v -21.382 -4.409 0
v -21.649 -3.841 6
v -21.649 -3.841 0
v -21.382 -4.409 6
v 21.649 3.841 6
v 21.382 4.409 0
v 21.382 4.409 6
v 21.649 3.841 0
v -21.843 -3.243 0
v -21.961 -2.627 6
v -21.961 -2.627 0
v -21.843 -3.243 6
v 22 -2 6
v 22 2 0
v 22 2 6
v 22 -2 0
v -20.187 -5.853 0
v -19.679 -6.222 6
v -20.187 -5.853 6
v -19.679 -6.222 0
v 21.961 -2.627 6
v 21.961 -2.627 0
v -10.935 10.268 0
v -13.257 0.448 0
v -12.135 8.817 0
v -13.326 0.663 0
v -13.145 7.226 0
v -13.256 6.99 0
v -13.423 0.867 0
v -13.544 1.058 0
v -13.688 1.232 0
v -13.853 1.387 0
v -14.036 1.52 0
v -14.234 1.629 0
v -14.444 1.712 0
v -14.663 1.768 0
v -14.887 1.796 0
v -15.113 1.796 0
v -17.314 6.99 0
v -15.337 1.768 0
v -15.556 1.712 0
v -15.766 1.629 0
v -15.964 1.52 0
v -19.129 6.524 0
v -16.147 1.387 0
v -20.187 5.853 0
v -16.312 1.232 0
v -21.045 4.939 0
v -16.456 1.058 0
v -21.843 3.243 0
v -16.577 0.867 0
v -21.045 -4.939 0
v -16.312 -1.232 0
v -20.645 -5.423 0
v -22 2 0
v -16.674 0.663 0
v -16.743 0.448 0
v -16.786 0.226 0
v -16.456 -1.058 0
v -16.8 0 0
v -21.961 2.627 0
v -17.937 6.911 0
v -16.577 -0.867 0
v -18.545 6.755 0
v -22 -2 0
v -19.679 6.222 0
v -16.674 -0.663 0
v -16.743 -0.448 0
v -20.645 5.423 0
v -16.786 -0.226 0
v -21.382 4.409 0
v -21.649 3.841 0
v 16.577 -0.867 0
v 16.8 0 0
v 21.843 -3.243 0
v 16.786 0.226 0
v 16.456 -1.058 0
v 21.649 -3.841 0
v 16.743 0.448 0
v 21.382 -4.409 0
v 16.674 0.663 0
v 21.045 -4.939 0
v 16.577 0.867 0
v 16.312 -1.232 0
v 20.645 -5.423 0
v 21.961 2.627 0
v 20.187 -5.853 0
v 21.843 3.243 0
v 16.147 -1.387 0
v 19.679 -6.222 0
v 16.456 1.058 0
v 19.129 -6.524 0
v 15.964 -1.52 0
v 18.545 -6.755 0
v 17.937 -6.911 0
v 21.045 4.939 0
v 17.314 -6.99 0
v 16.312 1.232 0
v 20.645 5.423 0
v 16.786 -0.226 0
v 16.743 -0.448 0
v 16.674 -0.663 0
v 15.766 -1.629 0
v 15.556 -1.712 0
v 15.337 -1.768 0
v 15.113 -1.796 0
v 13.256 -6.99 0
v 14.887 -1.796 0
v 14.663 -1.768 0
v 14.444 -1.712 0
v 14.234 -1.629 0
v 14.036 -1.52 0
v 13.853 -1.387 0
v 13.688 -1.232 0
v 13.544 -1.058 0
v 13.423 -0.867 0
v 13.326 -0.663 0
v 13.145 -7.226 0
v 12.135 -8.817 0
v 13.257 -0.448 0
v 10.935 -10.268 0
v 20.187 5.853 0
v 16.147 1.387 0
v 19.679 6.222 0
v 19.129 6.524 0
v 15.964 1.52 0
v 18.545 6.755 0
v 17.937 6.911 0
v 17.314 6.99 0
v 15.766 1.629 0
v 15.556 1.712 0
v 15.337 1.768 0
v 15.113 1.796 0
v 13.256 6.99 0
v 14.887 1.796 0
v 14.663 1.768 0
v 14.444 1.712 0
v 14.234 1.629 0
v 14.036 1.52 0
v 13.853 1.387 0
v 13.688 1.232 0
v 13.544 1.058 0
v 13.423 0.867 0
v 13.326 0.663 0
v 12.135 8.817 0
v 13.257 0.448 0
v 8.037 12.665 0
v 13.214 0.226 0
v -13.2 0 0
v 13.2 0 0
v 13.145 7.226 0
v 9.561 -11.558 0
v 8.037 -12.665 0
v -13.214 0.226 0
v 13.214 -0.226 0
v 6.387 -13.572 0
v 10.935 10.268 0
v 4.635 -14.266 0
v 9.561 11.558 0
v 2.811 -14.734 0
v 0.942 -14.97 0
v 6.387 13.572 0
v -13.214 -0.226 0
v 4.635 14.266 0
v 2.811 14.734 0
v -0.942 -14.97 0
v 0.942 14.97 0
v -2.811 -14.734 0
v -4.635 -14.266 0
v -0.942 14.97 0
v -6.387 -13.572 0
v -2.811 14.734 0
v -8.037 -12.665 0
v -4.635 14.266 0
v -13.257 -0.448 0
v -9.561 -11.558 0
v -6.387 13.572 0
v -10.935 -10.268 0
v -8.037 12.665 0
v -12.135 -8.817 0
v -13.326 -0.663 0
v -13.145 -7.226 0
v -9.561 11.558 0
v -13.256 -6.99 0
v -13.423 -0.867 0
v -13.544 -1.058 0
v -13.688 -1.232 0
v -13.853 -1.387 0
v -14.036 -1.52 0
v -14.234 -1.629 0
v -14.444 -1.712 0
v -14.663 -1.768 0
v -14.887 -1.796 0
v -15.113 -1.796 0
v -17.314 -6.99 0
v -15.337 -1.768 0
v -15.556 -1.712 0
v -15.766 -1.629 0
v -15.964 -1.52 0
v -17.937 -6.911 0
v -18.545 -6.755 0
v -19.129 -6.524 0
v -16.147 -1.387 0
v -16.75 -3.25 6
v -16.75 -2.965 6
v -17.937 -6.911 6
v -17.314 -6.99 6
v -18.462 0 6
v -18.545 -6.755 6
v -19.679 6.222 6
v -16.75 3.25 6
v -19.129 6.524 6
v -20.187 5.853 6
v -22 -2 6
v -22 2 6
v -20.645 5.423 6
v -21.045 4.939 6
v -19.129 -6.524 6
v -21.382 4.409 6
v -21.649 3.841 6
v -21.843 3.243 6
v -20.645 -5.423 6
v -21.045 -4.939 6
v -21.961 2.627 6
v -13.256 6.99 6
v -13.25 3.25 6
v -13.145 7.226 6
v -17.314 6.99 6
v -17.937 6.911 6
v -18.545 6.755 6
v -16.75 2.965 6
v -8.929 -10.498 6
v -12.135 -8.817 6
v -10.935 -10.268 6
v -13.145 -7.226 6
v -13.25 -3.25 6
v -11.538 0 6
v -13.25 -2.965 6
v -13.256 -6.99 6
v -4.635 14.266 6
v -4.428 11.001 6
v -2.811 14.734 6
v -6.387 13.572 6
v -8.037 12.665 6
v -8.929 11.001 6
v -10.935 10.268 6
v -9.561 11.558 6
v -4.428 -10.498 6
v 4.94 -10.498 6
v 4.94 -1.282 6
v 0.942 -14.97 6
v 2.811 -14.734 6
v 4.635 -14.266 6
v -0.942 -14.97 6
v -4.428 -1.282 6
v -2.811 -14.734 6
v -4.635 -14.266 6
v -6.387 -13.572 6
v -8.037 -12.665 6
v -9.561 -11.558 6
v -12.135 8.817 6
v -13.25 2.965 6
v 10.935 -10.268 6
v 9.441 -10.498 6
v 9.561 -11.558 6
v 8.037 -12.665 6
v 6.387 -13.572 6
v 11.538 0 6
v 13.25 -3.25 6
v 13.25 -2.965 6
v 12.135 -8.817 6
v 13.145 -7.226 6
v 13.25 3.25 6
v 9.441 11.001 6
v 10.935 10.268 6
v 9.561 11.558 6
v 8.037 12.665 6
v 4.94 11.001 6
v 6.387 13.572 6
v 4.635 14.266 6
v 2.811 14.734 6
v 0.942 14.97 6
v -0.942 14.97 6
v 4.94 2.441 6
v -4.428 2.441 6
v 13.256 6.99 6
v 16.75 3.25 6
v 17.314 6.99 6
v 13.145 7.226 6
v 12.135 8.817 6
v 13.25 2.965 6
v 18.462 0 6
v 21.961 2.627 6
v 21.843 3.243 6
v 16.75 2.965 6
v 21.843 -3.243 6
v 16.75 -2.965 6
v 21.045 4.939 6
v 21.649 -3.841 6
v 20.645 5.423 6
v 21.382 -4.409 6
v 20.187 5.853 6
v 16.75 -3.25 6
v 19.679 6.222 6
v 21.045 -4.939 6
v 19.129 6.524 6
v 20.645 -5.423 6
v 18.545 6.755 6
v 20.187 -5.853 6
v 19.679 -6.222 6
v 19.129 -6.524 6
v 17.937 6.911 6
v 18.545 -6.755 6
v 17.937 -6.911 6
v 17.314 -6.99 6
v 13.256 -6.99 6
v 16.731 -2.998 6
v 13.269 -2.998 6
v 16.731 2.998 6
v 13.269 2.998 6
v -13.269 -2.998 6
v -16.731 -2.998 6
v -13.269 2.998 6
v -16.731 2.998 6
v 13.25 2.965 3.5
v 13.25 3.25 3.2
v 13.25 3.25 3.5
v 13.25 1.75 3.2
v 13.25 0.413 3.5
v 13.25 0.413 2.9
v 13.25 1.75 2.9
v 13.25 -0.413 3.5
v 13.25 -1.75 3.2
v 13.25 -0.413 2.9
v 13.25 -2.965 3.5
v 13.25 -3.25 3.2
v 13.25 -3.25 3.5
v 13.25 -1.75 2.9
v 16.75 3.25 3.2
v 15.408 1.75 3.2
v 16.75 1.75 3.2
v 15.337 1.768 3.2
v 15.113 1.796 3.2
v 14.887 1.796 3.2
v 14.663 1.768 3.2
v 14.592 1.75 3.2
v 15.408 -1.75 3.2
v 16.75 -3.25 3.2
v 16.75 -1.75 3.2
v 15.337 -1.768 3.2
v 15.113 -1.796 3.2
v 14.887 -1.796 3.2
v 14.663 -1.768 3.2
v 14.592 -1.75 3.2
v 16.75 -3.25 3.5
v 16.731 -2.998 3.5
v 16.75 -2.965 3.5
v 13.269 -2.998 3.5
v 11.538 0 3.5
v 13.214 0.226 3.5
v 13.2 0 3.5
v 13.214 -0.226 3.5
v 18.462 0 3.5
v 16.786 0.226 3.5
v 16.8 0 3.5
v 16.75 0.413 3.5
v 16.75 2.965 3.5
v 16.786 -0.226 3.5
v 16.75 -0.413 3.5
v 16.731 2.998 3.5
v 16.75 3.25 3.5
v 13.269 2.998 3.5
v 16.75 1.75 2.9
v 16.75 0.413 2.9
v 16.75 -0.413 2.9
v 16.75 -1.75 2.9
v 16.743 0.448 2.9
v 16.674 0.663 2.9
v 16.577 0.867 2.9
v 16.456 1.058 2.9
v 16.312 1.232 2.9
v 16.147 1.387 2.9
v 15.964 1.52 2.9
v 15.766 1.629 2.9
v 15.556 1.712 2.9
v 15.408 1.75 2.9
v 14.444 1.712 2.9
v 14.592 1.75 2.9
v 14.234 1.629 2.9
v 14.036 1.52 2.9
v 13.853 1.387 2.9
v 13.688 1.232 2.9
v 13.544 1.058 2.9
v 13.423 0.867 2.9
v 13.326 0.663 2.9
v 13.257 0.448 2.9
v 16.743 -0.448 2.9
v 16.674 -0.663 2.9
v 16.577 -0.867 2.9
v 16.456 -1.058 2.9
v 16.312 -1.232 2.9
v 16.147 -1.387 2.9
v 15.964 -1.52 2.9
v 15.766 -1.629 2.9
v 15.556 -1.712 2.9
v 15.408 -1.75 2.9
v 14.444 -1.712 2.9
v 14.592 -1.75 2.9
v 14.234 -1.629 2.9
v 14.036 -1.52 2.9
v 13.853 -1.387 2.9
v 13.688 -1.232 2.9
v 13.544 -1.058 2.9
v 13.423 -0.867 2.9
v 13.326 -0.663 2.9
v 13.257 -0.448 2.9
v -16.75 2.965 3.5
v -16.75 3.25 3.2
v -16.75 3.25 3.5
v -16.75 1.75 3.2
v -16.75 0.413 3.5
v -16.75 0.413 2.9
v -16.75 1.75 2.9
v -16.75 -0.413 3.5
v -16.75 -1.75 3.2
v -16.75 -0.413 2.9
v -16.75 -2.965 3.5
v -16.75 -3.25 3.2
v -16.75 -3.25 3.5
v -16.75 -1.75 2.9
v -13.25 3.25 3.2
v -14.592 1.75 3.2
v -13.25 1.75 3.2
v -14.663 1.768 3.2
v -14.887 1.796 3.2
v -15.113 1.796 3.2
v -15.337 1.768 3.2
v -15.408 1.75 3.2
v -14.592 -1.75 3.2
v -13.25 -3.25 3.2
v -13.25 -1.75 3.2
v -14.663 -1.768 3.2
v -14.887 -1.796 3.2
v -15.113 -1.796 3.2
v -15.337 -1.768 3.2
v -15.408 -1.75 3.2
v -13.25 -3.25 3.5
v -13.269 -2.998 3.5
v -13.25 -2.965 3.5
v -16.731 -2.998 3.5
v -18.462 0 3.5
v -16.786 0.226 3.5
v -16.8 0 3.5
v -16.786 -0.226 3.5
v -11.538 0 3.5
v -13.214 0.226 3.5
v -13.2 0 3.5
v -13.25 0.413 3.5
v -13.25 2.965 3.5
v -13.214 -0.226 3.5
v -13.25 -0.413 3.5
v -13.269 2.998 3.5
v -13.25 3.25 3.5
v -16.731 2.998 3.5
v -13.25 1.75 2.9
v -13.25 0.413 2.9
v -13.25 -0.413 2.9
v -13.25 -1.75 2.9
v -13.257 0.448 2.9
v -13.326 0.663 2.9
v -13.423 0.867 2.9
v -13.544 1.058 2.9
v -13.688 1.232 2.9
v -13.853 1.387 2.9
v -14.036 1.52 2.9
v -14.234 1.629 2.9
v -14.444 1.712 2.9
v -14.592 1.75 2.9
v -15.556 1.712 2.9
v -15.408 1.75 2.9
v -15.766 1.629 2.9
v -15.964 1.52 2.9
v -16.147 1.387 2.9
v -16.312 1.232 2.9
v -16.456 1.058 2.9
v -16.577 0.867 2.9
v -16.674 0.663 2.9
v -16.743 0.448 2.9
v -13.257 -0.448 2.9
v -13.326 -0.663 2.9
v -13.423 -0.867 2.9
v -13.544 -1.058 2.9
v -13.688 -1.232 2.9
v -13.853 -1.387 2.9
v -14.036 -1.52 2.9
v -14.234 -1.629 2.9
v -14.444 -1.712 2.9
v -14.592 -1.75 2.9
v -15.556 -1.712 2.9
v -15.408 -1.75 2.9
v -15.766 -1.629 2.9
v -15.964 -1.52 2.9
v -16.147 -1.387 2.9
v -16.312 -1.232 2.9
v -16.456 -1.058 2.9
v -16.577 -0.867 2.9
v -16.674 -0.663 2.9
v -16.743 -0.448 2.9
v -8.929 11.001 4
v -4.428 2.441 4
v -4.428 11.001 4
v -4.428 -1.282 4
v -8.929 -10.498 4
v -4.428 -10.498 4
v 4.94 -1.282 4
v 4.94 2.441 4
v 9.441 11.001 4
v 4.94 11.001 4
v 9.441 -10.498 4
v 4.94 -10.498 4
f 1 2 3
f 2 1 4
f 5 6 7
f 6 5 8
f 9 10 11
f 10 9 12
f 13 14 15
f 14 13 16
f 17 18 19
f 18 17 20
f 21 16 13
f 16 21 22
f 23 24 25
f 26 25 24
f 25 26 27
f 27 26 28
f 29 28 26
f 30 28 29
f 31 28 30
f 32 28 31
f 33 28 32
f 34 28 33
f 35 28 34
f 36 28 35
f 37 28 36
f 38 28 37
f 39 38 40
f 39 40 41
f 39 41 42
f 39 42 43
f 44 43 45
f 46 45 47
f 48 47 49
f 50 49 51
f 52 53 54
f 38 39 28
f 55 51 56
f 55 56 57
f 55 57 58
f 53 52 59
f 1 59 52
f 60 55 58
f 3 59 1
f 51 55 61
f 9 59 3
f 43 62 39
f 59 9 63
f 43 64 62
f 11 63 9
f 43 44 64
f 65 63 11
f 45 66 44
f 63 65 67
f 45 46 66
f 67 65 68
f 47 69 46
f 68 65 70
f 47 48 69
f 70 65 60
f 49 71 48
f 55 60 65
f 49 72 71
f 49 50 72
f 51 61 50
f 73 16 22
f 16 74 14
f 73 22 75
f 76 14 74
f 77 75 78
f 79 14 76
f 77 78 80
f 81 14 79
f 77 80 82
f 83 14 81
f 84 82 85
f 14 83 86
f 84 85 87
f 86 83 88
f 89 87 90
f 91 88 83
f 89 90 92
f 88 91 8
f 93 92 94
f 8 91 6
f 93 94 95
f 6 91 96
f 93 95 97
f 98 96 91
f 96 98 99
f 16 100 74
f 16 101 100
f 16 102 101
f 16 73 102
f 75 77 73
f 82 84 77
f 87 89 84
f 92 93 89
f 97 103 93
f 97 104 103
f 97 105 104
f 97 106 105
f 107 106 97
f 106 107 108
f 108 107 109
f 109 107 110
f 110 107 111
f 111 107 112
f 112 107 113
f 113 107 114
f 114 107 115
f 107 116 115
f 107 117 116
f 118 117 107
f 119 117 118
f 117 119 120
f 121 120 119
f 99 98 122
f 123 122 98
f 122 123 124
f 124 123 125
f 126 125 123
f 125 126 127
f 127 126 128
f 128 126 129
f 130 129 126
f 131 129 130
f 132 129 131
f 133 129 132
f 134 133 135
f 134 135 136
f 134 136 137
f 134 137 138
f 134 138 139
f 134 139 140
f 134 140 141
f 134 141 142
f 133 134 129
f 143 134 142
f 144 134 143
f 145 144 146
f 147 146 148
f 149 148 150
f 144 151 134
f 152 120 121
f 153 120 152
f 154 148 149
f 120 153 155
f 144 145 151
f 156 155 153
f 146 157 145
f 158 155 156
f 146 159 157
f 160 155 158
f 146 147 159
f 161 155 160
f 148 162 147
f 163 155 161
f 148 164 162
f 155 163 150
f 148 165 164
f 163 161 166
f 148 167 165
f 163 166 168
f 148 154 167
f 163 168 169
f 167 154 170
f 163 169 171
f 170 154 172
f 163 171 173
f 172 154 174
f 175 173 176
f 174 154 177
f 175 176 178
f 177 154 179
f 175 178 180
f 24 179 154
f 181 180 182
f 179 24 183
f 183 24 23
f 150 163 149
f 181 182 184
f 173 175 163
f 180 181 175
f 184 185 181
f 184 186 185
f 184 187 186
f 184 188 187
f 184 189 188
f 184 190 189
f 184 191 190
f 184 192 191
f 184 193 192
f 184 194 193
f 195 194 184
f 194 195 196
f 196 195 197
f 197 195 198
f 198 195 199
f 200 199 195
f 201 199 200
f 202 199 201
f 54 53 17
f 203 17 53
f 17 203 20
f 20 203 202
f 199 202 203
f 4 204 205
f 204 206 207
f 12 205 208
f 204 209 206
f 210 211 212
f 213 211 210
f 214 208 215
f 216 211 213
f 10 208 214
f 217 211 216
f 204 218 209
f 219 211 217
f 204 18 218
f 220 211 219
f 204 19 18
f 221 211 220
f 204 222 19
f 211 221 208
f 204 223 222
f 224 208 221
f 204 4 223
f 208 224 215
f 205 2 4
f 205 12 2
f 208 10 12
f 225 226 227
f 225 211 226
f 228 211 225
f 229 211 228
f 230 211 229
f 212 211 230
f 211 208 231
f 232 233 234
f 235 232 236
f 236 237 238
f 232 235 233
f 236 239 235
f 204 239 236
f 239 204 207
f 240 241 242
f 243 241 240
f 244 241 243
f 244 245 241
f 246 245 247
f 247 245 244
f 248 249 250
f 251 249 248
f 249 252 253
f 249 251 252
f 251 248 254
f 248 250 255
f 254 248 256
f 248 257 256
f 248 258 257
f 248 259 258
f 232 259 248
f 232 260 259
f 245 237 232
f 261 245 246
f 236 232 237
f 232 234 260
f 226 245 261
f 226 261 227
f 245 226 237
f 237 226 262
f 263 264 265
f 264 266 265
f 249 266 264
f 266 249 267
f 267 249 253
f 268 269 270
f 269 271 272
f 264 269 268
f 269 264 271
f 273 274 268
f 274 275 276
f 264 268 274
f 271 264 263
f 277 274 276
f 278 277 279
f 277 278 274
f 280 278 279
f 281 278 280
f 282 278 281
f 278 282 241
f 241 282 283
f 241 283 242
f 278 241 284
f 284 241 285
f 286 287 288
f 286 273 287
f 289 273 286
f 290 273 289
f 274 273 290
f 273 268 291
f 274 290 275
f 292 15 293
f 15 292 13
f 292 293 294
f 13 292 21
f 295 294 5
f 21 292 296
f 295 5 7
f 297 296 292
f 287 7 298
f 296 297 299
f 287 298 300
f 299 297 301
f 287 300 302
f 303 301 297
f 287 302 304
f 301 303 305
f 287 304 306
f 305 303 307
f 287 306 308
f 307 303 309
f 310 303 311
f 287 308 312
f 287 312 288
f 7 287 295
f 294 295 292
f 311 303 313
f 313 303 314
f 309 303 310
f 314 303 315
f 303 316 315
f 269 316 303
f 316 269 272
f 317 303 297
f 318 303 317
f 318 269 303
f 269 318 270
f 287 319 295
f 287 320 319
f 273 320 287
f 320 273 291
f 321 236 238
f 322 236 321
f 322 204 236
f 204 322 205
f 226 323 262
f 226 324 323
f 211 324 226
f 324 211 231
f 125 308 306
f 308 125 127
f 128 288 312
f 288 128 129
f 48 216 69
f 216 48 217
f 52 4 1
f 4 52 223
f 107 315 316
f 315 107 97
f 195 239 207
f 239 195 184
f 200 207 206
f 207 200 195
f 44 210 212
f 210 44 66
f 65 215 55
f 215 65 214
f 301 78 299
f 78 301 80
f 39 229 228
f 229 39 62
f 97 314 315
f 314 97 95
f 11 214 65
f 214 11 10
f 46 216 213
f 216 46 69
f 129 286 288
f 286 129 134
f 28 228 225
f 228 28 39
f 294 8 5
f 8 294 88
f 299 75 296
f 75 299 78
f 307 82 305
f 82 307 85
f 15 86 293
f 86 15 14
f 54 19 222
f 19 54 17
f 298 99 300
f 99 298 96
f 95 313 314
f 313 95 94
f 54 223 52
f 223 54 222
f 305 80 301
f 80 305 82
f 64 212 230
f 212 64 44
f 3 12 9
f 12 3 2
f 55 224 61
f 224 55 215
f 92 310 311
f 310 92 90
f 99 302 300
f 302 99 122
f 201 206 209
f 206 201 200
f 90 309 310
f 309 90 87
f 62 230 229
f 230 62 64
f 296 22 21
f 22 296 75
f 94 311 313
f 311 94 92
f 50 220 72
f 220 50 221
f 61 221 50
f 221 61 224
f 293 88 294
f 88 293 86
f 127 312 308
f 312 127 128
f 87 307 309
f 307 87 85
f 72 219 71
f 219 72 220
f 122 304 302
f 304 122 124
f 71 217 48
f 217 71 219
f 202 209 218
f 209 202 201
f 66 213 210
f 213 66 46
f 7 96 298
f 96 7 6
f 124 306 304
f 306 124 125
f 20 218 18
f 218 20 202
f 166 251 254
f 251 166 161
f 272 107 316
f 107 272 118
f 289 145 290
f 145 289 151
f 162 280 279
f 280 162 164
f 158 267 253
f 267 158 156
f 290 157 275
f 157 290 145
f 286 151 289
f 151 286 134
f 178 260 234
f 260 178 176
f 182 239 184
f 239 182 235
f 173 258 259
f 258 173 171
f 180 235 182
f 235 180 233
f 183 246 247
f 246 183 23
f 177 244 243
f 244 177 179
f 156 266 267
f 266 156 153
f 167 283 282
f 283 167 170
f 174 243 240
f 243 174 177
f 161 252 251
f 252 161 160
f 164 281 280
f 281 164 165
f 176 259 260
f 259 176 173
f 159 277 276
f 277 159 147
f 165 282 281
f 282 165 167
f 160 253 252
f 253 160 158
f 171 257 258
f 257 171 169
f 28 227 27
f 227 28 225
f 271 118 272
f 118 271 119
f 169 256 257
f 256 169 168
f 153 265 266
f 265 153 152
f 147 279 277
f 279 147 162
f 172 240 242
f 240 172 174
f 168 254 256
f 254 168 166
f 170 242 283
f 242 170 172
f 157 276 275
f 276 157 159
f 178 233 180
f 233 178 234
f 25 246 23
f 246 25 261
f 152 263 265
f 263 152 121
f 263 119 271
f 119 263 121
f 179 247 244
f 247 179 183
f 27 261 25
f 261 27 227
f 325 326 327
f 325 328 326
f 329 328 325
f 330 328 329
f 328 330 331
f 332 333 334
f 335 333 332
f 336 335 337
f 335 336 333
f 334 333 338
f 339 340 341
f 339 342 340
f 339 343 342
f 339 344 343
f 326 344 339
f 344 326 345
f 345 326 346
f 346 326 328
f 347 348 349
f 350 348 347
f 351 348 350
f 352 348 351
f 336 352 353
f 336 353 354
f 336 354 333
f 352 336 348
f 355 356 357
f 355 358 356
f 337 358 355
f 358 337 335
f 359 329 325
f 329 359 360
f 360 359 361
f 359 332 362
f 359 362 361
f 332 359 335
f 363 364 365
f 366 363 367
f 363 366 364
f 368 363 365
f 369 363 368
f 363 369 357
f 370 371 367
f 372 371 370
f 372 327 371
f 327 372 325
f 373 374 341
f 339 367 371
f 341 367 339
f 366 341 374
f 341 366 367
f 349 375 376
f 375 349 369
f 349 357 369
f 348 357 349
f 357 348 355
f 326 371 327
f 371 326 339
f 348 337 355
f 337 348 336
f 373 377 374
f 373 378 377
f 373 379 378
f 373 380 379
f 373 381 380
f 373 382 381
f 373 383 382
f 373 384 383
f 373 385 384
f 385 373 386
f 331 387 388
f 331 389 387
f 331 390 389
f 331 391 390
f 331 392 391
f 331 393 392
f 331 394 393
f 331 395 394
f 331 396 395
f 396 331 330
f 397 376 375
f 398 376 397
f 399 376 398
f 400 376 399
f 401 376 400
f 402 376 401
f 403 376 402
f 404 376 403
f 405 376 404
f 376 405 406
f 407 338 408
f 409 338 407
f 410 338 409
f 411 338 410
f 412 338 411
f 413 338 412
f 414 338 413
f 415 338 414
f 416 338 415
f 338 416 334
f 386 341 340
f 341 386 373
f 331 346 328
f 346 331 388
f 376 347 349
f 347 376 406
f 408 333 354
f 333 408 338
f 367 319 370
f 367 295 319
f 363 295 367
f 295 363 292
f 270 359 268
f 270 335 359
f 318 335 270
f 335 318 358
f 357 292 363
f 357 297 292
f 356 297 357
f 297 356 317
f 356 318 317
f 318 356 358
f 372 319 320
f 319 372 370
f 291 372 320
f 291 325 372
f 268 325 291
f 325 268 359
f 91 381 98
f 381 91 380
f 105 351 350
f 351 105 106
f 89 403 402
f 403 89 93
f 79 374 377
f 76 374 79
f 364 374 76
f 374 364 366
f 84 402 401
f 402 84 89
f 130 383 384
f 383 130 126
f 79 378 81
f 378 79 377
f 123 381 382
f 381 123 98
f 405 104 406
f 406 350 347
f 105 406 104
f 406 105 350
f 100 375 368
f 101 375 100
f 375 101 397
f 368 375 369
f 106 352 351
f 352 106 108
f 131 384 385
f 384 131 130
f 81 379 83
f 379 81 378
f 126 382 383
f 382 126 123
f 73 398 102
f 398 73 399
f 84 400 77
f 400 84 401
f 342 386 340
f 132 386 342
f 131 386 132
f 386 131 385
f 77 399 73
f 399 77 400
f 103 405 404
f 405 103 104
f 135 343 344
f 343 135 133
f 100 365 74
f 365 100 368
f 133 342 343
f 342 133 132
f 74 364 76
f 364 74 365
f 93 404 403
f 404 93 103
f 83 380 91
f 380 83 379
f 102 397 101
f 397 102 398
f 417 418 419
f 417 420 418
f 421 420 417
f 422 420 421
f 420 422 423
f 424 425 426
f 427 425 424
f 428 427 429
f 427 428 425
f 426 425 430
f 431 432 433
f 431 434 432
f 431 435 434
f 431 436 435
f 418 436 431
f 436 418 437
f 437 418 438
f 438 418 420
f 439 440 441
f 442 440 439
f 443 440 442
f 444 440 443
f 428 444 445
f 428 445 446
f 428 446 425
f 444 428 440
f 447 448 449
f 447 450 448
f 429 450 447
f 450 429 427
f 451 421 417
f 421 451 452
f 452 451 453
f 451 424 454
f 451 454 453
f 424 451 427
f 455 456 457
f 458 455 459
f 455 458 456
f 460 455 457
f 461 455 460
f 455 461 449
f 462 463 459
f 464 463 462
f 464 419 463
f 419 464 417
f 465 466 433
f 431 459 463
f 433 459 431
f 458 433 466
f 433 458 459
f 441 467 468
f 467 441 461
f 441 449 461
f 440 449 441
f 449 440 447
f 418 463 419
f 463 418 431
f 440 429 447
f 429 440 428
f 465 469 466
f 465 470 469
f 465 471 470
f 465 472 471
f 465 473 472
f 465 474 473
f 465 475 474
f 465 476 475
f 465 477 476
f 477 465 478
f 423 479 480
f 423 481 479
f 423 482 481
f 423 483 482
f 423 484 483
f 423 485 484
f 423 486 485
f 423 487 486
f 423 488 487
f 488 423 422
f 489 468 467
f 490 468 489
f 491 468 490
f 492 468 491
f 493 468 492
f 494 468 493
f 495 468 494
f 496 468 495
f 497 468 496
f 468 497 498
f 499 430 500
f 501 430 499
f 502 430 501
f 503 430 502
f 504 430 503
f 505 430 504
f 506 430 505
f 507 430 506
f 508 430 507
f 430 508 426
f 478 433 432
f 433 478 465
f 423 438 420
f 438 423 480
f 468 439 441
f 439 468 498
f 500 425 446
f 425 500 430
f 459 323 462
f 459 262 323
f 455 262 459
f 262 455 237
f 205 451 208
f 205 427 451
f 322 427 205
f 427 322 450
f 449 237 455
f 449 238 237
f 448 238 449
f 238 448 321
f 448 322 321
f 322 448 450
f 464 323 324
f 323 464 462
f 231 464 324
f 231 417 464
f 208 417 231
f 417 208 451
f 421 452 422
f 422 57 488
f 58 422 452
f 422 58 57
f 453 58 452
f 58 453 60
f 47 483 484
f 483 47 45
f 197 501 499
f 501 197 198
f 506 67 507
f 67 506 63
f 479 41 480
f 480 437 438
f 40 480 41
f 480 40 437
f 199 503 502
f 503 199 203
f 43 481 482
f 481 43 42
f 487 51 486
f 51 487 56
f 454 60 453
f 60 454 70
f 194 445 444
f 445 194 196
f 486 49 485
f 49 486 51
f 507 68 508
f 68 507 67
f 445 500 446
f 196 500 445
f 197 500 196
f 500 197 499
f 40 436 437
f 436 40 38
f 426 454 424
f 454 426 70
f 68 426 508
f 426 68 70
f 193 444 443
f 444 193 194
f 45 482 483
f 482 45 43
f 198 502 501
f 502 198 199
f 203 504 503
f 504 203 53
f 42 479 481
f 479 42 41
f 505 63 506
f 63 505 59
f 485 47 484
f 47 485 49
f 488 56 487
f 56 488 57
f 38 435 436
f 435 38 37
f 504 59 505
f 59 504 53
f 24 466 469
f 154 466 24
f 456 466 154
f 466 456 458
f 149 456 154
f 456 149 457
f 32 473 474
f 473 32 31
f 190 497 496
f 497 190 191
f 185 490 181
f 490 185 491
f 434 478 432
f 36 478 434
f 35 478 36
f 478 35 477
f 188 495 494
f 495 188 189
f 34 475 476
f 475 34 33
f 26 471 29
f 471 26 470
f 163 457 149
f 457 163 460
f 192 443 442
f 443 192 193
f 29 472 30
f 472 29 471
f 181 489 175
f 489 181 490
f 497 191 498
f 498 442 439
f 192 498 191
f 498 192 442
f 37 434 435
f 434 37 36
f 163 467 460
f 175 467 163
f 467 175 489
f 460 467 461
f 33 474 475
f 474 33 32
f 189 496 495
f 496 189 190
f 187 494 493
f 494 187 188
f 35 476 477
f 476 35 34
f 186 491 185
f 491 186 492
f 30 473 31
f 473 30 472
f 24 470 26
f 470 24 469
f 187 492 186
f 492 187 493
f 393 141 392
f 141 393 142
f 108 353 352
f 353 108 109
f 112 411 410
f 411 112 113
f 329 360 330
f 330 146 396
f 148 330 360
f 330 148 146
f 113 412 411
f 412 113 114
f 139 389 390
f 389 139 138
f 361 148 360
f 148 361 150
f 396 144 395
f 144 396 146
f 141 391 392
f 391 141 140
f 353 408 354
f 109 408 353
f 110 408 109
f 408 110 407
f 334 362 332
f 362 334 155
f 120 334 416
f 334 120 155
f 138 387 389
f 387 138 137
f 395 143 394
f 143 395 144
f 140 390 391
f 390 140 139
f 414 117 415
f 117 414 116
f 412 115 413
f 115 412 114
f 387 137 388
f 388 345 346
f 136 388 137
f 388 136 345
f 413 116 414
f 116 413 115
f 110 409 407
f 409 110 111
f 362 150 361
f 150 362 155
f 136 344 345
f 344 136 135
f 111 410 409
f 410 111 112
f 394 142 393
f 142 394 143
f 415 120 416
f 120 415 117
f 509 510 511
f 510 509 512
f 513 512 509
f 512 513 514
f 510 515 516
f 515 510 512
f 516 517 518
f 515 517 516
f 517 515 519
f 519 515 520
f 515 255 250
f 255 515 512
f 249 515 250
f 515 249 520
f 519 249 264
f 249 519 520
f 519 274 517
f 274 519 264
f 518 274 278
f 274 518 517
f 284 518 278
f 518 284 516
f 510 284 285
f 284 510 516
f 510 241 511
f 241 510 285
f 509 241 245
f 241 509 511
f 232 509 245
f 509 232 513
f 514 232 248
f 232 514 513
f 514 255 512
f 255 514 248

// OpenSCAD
$fn = 50;


difference() {
	union() {
		hull() {
			translate(v = [-17.0000000000, 2.0000000000, 0]) {
				cylinder(h = 6, r = 5);
			}
			translate(v = [17.0000000000, 2.0000000000, 0]) {
				cylinder(h = 6, r = 5);
			}
			translate(v = [-17.0000000000, -2.0000000000, 0]) {
				cylinder(h = 6, r = 5);
			}
			translate(v = [17.0000000000, -2.0000000000, 0]) {
				cylinder(h = 6, r = 5);
			}
		}
		cylinder(h = 6, r = 15.0000000000);
	}
	union() {
		translate(v = [15.0000000000, 0, -20]) {
			rotate(a = [0, 180, 0]) {
				difference() {
					union() {
						translate(v = [0, 0, -26.0000000000]) {
							rotate(a = [0, 0, 0]) {
								difference() {
									union() {
										#translate(v = [-1.7500000000, -3.2500000000, -0.3000000000]) {
											cube(size = [3.5000000000, 6.5000000000, 0.3000000000]);
										}
										#translate(v = [-1.7500000000, -1.7500000000, -0.6000000000]) {
											cube(size = [3.5000000000, 3.5000000000, 0.3000000000]);
										}
										#translate(v = [-1.7500000000, -3.2500000000, 2.5000000000]) {
											cube(size = [3.5000000000, 6.5000000000, 0.3000000000]);
										}
										#translate(v = [-1.7500000000, -1.7500000000, 2.8000000000]) {
											cube(size = [3.5000000000, 3.5000000000, 0.3000000000]);
										}
										#linear_extrude(height = 2.5000000000) {
											polygon(points = [[3.4620000000, 0.0000000000], [1.7310000000, 2.9981799479], [-1.7310000000, 2.9981799479], [-3.4620000000, 0.0000000000], [-1.7310000000, -2.9981799479], [1.7310000000, -2.9981799479]]);
										}
										#translate(v = [-1.7500000000, -3.2500000000, -0.3000000000]) {
											cube(size = [3.5000000000, 6.5000000000, 0.3000000000]);
										}
										#translate(v = [-1.7500000000, -1.7500000000, -0.6000000000]) {
											cube(size = [3.5000000000, 3.5000000000, 0.3000000000]);
										}
										#translate(v = [-1.7500000000, -3.2500000000, 2.5000000000]) {
											cube(size = [3.5000000000, 6.5000000000, 0.3000000000]);
										}
										#translate(v = [-1.7500000000, -1.7500000000, 2.8000000000]) {
											cube(size = [3.5000000000, 3.5000000000, 0.3000000000]);
										}
										#translate(v = [-1.7500000000, -3.2500000000, -0.3000000000]) {
											cube(size = [3.5000000000, 6.5000000000, 0.3000000000]);
										}
										#translate(v = [-1.7500000000, -1.7500000000, -0.6000000000]) {
											cube(size = [3.5000000000, 3.5000000000, 0.3000000000]);
										}
										#translate(v = [-1.7500000000, -3.2500000000, 2.5000000000]) {
											cube(size = [3.5000000000, 6.5000000000, 0.3000000000]);
										}
										#translate(v = [-1.7500000000, -1.7500000000, 2.8000000000]) {
											cube(size = [3.5000000000, 3.5000000000, 0.3000000000]);
										}
									}
									union();
								}
							}
						}
						translate(v = [0, 0, -26.0000000000]) {
							rotate(a = [0, 0, 0]) {
								difference() {
									union() {
										#translate(v = [-1.7500000000, -3.2500000000, -0.3000000000]) {
											cube(size = [3.5000000000, 6.5000000000, 0.3000000000]);
										}
										#translate(v = [-1.7500000000, -1.7500000000, -0.6000000000]) {
											cube(size = [3.5000000000, 3.5000000000, 0.3000000000]);
										}
										#translate(v = [-1.7500000000, -3.2500000000, 2.5000000000]) {
											cube(size = [3.5000000000, 6.5000000000, 0.3000000000]);
										}
										#translate(v = [-1.7500000000, -1.7500000000, 2.8000000000]) {
											cube(size = [3.5000000000, 3.5000000000, 0.3000000000]);
										}
										#linear_extrude(height = 2.5000000000) {
											polygon(points = [[3.4620000000, 0.0000000000], [1.7310000000, 2.9981799479], [-1.7310000000, 2.9981799479], [-3.4620000000, 0.0000000000], [-1.7310000000, -2.9981799479], [1.7310000000, -2.9981799479]]);
										}
										#translate(v = [-1.7500000000, -3.2500000000, -0.3000000000]) {
											cube(size = [3.5000000000, 6.5000000000, 0.3000000000]);
										}
										#translate(v = [-1.7500000000, -1.7500000000, -0.6000000000]) {
											cube(size = [3.5000000000, 3.5000000000, 0.3000000000]);
										}
										#translate(v = [-1.7500000000, -3.2500000000, 2.5000000000]) {
											cube(size = [3.5000000000, 6.5000000000, 0.3000000000]);
										}
										#translate(v = [-1.7500000000, -1.7500000000, 2.8000000000]) {
											cube(size = [3.5000000000, 3.5000000000, 0.3000000000]);
										}
										#translate(v = [-1.7500000000, -3.2500000000, -0.3000000000]) {
											cube(size = [3.5000000000, 6.5000000000, 0.3000000000]);
										}
										#translate(v = [-1.7500000000, -1.7500000000, -0.6000000000]) {
											cube(size = [3.5000000000, 3.5000000000, 0.3000000000]);
										}
										#translate(v = [-1.7500000000, -3.2500000000, 2.5000000000]) {
											cube(size = [3.5000000000, 6.5000000000, 0.3000000000]);
										}
										#translate(v = [-1.7500000000, -1.7500000000, 2.8000000000]) {
											cube(size = [3.5000000000, 3.5000000000, 0.3000000000]);
										}
									}
									union();
								}
							}
						}
						translate(v = [0, 0, -26.0000000000]) {
							rotate(a = [0, 0, 0]) {
								difference() {
									union() {
										#translate(v = [-1.7500000000, -3.2500000000, -0.3000000000]) {
											cube(size = [3.5000000000, 6.5000000000, 0.3000000000]);
										}
										#translate(v = [-1.7500000000, -1.7500000000, -0.6000000000]) {
											cube(size = [3.5000000000, 3.5000000000, 0.3000000000]);
										}
										#translate(v = [-1.7500000000, -3.2500000000, 2.5000000000]) {
											cube(size = [3.5000000000, 6.5000000000, 0.3000000000]);
										}
										#translate(v = [-1.7500000000, -1.7500000000, 2.8000000000]) {
											cube(size = [3.5000000000, 3.5000000000, 0.3000000000]);
										}
										#linear_extrude(height = 2.5000000000) {
											polygon(points = [[3.4620000000, 0.0000000000], [1.7310000000, 2.9981799479], [-1.7310000000, 2.9981799479], [-3.4620000000, 0.0000000000], [-1.7310000000, -2.9981799479], [1.7310000000, -2.9981799479]]);
										}
										#translate(v = [-1.7500000000, -3.2500000000, -0.3000000000]) {
											cube(size = [3.5000000000, 6.5000000000, 0.3000000000]);
										}
										#translate(v = [-1.7500000000, -1.7500000000, -0.6000000000]) {
											cube(size = [3.5000000000, 3.5000000000, 0.3000000000]);
										}
										#translate(v = [-1.7500000000, -3.2500000000, 2.5000000000]) {
											cube(size = [3.5000000000, 6.5000000000, 0.3000000000]);
										}
										#translate(v = [-1.7500000000, -1.7500000000, 2.8000000000]) {
											cube(size = [3.5000000000, 3.5000000000, 0.3000000000]);
										}
										#translate(v = [-1.7500000000, -3.2500000000, -0.3000000000]) {
											cube(size = [3.5000000000, 6.5000000000, 0.3000000000]);
										}
										#translate(v = [-1.7500000000, -1.7500000000, -0.6000000000]) {
											cube(size = [3.5000000000, 3.5000000000, 0.3000000000]);
										}
										#translate(v = [-1.7500000000, -3.2500000000, 2.5000000000]) {
											cube(size = [3.5000000000, 6.5000000000, 0.3000000000]);
										}
										#translate(v = [-1.7500000000, -1.7500000000, 2.8000000000]) {
											cube(size = [3.5000000000, 3.5000000000, 0.3000000000]);
										}
									}
									union();
								}
							}
						}
						#translate(v = [0, 0, -26.0000000000]) {
							cylinder(h = 26, r = 1.5000000000);
						}
						#translate(v = [0, 0, -1.9000000000]) {
							cylinder(h = 1.9000000000, r1 = 1.8000000000, r2 = 3.6000000000);
						}
						#translate(v = [0, 0, -26.0000000000]) {
							cylinder(h = 26, r = 1.8000000000);
						}
						#translate(v = [0, 0, -26.0000000000]) {
							cylinder(h = 26, r = 1.5000000000);
						}
					}
					union();
				}
			}
		}
		translate(v = [-15.0000000000, 0, -20]) {
			rotate(a = [0, 180, 0]) {
				difference() {
					union() {
						translate(v = [0, 0, -26.0000000000]) {
							rotate(a = [0, 0, 0]) {
								difference() {
									union() {
										#translate(v = [-1.7500000000, -3.2500000000, -0.3000000000]) {
											cube(size = [3.5000000000, 6.5000000000, 0.3000000000]);
										}
										#translate(v = [-1.7500000000, -1.7500000000, -0.6000000000]) {
											cube(size = [3.5000000000, 3.5000000000, 0.3000000000]);
										}
										#translate(v = [-1.7500000000, -3.2500000000, 2.5000000000]) {
											cube(size = [3.5000000000, 6.5000000000, 0.3000000000]);
										}
										#translate(v = [-1.7500000000, -1.7500000000, 2.8000000000]) {
											cube(size = [3.5000000000, 3.5000000000, 0.3000000000]);
										}
										#linear_extrude(height = 2.5000000000) {
											polygon(points = [[3.4620000000, 0.0000000000], [1.7310000000, 2.9981799479], [-1.7310000000, 2.9981799479], [-3.4620000000, 0.0000000000], [-1.7310000000, -2.9981799479], [1.7310000000, -2.9981799479]]);
										}
										#translate(v = [-1.7500000000, -3.2500000000, -0.3000000000]) {
											cube(size = [3.5000000000, 6.5000000000, 0.3000000000]);
										}
										#translate(v = [-1.7500000000, -1.7500000000, -0.6000000000]) {
											cube(size = [3.5000000000, 3.5000000000, 0.3000000000]);
										}
										#translate(v = [-1.7500000000, -3.2500000000, 2.5000000000]) {
											cube(size = [3.5000000000, 6.5000000000, 0.3000000000]);
										}
										#translate(v = [-1.7500000000, -1.7500000000, 2.8000000000]) {
											cube(size = [3.5000000000, 3.5000000000, 0.3000000000]);
										}
										#translate(v = [-1.7500000000, -3.2500000000, -0.3000000000]) {
											cube(size = [3.5000000000, 6.5000000000, 0.3000000000]);
										}
										#translate(v = [-1.7500000000, -1.7500000000, -0.6000000000]) {
											cube(size = [3.5000000000, 3.5000000000, 0.3000000000]);
										}
										#translate(v = [-1.7500000000, -3.2500000000, 2.5000000000]) {
											cube(size = [3.5000000000, 6.5000000000, 0.3000000000]);
										}
										#translate(v = [-1.7500000000, -1.7500000000, 2.8000000000]) {
											cube(size = [3.5000000000, 3.5000000000, 0.3000000000]);
										}
									}
									union();
								}
							}
						}
						translate(v = [0, 0, -26.0000000000]) {
							rotate(a = [0, 0, 0]) {
								difference() {
									union() {
										#translate(v = [-1.7500000000, -3.2500000000, -0.3000000000]) {
											cube(size = [3.5000000000, 6.5000000000, 0.3000000000]);
										}
										#translate(v = [-1.7500000000, -1.7500000000, -0.6000000000]) {
											cube(size = [3.5000000000, 3.5000000000, 0.3000000000]);
										}
										#translate(v = [-1.7500000000, -3.2500000000, 2.5000000000]) {
											cube(size = [3.5000000000, 6.5000000000, 0.3000000000]);
										}
										#translate(v = [-1.7500000000, -1.7500000000, 2.8000000000]) {
											cube(size = [3.5000000000, 3.5000000000, 0.3000000000]);
										}
										#linear_extrude(height = 2.5000000000) {
											polygon(points = [[3.4620000000, 0.0000000000], [1.7310000000, 2.9981799479], [-1.7310000000, 2.9981799479], [-3.4620000000, 0.0000000000], [-1.7310000000, -2.9981799479], [1.7310000000, -2.9981799479]]);
										}
										#translate(v = [-1.7500000000, -3.2500000000, -0.3000000000]) {
											cube(size = [3.5000000000, 6.5000000000, 0.3000000000]);
										}
										#translate(v = [-1.7500000000, -1.7500000000, -0.6000000000]) {
											cube(size = [3.5000000000, 3.5000000000, 0.3000000000]);
										}
										#translate(v = [-1.7500000000, -3.2500000000, 2.5000000000]) {
											cube(size = [3.5000000000, 6.5000000000, 0.3000000000]);
										}
										#translate(v = [-1.7500000000, -1.7500000000, 2.8000000000]) {
											cube(size = [3.5000000000, 3.5000000000, 0.3000000000]);
										}
										#translate(v = [-1.7500000000, -3.2500000000, -0.3000000000]) {
											cube(size = [3.5000000000, 6.5000000000, 0.3000000000]);
										}
										#translate(v = [-1.7500000000, -1.7500000000, -0.6000000000]) {
											cube(size = [3.5000000000, 3.5000000000, 0.3000000000]);
										}
										#translate(v = [-1.7500000000, -3.2500000000, 2.5000000000]) {
											cube(size = [3.5000000000, 6.5000000000, 0.3000000000]);
										}
										#translate(v = [-1.7500000000, -1.7500000000, 2.8000000000]) {
											cube(size = [3.5000000000, 3.5000000000, 0.3000000000]);
										}
									}
									union();
								}
							}
						}
						translate(v = [0, 0, -26.0000000000]) {
							rotate(a = [0, 0, 0]) {
								difference() {
									union() {
										#translate(v = [-1.7500000000, -3.2500000000, -0.3000000000]) {
											cube(size = [3.5000000000, 6.5000000000, 0.3000000000]);
										}
										#translate(v = [-1.7500000000, -1.7500000000, -0.6000000000]) {
											cube(size = [3.5000000000, 3.5000000000, 0.3000000000]);
										}
										#translate(v = [-1.7500000000, -3.2500000000, 2.5000000000]) {
											cube(size = [3.5000000000, 6.5000000000, 0.3000000000]);
										}
										#translate(v = [-1.7500000000, -1.7500000000, 2.8000000000]) {
											cube(size = [3.5000000000, 3.5000000000, 0.3000000000]);
										}
										#linear_extrude(height = 2.5000000000) {
											polygon(points = [[3.4620000000, 0.0000000000], [1.7310000000, 2.9981799479], [-1.7310000000, 2.9981799479], [-3.4620000000, 0.0000000000], [-1.7310000000, -2.9981799479], [1.7310000000, -2.9981799479]]);
										}
										#translate(v = [-1.7500000000, -3.2500000000, -0.3000000000]) {
											cube(size = [3.5000000000, 6.5000000000, 0.3000000000]);
										}
										#translate(v = [-1.7500000000, -1.7500000000, -0.6000000000]) {
											cube(size = [3.5000000000, 3.5000000000, 0.3000000000]);
										}
										#translate(v = [-1.7500000000, -3.2500000000, 2.5000000000]) {
											cube(size = [3.5000000000, 6.5000000000, 0.3000000000]);
										}
										#translate(v = [-1.7500000000, -1.7500000000, 2.8000000000]) {
											cube(size = [3.5000000000, 3.5000000000, 0.3000000000]);
										}
										#translate(v = [-1.7500000000, -3.2500000000, -0.3000000000]) {
											cube(size = [3.5000000000, 6.5000000000, 0.3000000000]);
										}
										#translate(v = [-1.7500000000, -1.7500000000, -0.6000000000]) {
											cube(size = [3.5000000000, 3.5000000000, 0.3000000000]);
										}
										#translate(v = [-1.7500000000, -3.2500000000, 2.5000000000]) {
											cube(size = [3.5000000000, 6.5000000000, 0.3000000000]);
										}
										#translate(v = [-1.7500000000, -1.7500000000, 2.8000000000]) {
											cube(size = [3.5000000000, 3.5000000000, 0.3000000000]);
										}
									}
									union();
								}
							}
						}
						#translate(v = [0, 0, -26.0000000000]) {
							cylinder(h = 26, r = 1.5000000000);
						}
						#translate(v = [0, 0, -1.9000000000]) {
							cylinder(h = 1.9000000000, r1 = 1.8000000000, r2 = 3.6000000000);
						}
						#translate(v = [0, 0, -26.0000000000]) {
							cylinder(h = 26, r = 1.8000000000);
						}
						#translate(v = [0, 0, -26.0000000000]) {
							cylinder(h = 26, r = 1.5000000000);
						}
					}
					union();
				}
			}
		}
		translate(v = [-15.0000000000, 0.0000000000, 0]) {
			cylinder(h = 6, r = 1.8000000000);
		}
		translate(v = [15.0000000000, 0.0000000000, 0]) {
			cylinder(h = 6, r = 1.8000000000);
		}
		translate(v = [-15.0000000000, 0.0000000000, 0]) {
			cylinder(h = 6, r = 1.8000000000);
		}
		translate(v = [15.0000000000, 0.0000000000, 0]) {
			cylinder(h = 6, r = 1.8000000000);
		}
		translate(v = [-15.0000000000, 0.0000000000, 0]) {
			cylinder(h = 6, r = 1.8000000000);
		}
		translate(v = [15.0000000000, 0.0000000000, 0]) {
			cylinder(h = 6, r = 1.8000000000);
		}
		translate(v = [-15.0000000000, 0.0000000000, 0]) {
			cylinder(h = 6, r = 1.8000000000);
		}
		translate(v = [15.0000000000, 0.0000000000, 0]) {
			cylinder(h = 6, r = 1.8000000000);
		}
		#translate(v = [0, 0, 4]) {
			linear_extrude(height = 2) {
				text(font = "Arial:Bold", halign = "center", size = 22.5000000000, text = "H", valign = "center");
			}
		}
	}
}
